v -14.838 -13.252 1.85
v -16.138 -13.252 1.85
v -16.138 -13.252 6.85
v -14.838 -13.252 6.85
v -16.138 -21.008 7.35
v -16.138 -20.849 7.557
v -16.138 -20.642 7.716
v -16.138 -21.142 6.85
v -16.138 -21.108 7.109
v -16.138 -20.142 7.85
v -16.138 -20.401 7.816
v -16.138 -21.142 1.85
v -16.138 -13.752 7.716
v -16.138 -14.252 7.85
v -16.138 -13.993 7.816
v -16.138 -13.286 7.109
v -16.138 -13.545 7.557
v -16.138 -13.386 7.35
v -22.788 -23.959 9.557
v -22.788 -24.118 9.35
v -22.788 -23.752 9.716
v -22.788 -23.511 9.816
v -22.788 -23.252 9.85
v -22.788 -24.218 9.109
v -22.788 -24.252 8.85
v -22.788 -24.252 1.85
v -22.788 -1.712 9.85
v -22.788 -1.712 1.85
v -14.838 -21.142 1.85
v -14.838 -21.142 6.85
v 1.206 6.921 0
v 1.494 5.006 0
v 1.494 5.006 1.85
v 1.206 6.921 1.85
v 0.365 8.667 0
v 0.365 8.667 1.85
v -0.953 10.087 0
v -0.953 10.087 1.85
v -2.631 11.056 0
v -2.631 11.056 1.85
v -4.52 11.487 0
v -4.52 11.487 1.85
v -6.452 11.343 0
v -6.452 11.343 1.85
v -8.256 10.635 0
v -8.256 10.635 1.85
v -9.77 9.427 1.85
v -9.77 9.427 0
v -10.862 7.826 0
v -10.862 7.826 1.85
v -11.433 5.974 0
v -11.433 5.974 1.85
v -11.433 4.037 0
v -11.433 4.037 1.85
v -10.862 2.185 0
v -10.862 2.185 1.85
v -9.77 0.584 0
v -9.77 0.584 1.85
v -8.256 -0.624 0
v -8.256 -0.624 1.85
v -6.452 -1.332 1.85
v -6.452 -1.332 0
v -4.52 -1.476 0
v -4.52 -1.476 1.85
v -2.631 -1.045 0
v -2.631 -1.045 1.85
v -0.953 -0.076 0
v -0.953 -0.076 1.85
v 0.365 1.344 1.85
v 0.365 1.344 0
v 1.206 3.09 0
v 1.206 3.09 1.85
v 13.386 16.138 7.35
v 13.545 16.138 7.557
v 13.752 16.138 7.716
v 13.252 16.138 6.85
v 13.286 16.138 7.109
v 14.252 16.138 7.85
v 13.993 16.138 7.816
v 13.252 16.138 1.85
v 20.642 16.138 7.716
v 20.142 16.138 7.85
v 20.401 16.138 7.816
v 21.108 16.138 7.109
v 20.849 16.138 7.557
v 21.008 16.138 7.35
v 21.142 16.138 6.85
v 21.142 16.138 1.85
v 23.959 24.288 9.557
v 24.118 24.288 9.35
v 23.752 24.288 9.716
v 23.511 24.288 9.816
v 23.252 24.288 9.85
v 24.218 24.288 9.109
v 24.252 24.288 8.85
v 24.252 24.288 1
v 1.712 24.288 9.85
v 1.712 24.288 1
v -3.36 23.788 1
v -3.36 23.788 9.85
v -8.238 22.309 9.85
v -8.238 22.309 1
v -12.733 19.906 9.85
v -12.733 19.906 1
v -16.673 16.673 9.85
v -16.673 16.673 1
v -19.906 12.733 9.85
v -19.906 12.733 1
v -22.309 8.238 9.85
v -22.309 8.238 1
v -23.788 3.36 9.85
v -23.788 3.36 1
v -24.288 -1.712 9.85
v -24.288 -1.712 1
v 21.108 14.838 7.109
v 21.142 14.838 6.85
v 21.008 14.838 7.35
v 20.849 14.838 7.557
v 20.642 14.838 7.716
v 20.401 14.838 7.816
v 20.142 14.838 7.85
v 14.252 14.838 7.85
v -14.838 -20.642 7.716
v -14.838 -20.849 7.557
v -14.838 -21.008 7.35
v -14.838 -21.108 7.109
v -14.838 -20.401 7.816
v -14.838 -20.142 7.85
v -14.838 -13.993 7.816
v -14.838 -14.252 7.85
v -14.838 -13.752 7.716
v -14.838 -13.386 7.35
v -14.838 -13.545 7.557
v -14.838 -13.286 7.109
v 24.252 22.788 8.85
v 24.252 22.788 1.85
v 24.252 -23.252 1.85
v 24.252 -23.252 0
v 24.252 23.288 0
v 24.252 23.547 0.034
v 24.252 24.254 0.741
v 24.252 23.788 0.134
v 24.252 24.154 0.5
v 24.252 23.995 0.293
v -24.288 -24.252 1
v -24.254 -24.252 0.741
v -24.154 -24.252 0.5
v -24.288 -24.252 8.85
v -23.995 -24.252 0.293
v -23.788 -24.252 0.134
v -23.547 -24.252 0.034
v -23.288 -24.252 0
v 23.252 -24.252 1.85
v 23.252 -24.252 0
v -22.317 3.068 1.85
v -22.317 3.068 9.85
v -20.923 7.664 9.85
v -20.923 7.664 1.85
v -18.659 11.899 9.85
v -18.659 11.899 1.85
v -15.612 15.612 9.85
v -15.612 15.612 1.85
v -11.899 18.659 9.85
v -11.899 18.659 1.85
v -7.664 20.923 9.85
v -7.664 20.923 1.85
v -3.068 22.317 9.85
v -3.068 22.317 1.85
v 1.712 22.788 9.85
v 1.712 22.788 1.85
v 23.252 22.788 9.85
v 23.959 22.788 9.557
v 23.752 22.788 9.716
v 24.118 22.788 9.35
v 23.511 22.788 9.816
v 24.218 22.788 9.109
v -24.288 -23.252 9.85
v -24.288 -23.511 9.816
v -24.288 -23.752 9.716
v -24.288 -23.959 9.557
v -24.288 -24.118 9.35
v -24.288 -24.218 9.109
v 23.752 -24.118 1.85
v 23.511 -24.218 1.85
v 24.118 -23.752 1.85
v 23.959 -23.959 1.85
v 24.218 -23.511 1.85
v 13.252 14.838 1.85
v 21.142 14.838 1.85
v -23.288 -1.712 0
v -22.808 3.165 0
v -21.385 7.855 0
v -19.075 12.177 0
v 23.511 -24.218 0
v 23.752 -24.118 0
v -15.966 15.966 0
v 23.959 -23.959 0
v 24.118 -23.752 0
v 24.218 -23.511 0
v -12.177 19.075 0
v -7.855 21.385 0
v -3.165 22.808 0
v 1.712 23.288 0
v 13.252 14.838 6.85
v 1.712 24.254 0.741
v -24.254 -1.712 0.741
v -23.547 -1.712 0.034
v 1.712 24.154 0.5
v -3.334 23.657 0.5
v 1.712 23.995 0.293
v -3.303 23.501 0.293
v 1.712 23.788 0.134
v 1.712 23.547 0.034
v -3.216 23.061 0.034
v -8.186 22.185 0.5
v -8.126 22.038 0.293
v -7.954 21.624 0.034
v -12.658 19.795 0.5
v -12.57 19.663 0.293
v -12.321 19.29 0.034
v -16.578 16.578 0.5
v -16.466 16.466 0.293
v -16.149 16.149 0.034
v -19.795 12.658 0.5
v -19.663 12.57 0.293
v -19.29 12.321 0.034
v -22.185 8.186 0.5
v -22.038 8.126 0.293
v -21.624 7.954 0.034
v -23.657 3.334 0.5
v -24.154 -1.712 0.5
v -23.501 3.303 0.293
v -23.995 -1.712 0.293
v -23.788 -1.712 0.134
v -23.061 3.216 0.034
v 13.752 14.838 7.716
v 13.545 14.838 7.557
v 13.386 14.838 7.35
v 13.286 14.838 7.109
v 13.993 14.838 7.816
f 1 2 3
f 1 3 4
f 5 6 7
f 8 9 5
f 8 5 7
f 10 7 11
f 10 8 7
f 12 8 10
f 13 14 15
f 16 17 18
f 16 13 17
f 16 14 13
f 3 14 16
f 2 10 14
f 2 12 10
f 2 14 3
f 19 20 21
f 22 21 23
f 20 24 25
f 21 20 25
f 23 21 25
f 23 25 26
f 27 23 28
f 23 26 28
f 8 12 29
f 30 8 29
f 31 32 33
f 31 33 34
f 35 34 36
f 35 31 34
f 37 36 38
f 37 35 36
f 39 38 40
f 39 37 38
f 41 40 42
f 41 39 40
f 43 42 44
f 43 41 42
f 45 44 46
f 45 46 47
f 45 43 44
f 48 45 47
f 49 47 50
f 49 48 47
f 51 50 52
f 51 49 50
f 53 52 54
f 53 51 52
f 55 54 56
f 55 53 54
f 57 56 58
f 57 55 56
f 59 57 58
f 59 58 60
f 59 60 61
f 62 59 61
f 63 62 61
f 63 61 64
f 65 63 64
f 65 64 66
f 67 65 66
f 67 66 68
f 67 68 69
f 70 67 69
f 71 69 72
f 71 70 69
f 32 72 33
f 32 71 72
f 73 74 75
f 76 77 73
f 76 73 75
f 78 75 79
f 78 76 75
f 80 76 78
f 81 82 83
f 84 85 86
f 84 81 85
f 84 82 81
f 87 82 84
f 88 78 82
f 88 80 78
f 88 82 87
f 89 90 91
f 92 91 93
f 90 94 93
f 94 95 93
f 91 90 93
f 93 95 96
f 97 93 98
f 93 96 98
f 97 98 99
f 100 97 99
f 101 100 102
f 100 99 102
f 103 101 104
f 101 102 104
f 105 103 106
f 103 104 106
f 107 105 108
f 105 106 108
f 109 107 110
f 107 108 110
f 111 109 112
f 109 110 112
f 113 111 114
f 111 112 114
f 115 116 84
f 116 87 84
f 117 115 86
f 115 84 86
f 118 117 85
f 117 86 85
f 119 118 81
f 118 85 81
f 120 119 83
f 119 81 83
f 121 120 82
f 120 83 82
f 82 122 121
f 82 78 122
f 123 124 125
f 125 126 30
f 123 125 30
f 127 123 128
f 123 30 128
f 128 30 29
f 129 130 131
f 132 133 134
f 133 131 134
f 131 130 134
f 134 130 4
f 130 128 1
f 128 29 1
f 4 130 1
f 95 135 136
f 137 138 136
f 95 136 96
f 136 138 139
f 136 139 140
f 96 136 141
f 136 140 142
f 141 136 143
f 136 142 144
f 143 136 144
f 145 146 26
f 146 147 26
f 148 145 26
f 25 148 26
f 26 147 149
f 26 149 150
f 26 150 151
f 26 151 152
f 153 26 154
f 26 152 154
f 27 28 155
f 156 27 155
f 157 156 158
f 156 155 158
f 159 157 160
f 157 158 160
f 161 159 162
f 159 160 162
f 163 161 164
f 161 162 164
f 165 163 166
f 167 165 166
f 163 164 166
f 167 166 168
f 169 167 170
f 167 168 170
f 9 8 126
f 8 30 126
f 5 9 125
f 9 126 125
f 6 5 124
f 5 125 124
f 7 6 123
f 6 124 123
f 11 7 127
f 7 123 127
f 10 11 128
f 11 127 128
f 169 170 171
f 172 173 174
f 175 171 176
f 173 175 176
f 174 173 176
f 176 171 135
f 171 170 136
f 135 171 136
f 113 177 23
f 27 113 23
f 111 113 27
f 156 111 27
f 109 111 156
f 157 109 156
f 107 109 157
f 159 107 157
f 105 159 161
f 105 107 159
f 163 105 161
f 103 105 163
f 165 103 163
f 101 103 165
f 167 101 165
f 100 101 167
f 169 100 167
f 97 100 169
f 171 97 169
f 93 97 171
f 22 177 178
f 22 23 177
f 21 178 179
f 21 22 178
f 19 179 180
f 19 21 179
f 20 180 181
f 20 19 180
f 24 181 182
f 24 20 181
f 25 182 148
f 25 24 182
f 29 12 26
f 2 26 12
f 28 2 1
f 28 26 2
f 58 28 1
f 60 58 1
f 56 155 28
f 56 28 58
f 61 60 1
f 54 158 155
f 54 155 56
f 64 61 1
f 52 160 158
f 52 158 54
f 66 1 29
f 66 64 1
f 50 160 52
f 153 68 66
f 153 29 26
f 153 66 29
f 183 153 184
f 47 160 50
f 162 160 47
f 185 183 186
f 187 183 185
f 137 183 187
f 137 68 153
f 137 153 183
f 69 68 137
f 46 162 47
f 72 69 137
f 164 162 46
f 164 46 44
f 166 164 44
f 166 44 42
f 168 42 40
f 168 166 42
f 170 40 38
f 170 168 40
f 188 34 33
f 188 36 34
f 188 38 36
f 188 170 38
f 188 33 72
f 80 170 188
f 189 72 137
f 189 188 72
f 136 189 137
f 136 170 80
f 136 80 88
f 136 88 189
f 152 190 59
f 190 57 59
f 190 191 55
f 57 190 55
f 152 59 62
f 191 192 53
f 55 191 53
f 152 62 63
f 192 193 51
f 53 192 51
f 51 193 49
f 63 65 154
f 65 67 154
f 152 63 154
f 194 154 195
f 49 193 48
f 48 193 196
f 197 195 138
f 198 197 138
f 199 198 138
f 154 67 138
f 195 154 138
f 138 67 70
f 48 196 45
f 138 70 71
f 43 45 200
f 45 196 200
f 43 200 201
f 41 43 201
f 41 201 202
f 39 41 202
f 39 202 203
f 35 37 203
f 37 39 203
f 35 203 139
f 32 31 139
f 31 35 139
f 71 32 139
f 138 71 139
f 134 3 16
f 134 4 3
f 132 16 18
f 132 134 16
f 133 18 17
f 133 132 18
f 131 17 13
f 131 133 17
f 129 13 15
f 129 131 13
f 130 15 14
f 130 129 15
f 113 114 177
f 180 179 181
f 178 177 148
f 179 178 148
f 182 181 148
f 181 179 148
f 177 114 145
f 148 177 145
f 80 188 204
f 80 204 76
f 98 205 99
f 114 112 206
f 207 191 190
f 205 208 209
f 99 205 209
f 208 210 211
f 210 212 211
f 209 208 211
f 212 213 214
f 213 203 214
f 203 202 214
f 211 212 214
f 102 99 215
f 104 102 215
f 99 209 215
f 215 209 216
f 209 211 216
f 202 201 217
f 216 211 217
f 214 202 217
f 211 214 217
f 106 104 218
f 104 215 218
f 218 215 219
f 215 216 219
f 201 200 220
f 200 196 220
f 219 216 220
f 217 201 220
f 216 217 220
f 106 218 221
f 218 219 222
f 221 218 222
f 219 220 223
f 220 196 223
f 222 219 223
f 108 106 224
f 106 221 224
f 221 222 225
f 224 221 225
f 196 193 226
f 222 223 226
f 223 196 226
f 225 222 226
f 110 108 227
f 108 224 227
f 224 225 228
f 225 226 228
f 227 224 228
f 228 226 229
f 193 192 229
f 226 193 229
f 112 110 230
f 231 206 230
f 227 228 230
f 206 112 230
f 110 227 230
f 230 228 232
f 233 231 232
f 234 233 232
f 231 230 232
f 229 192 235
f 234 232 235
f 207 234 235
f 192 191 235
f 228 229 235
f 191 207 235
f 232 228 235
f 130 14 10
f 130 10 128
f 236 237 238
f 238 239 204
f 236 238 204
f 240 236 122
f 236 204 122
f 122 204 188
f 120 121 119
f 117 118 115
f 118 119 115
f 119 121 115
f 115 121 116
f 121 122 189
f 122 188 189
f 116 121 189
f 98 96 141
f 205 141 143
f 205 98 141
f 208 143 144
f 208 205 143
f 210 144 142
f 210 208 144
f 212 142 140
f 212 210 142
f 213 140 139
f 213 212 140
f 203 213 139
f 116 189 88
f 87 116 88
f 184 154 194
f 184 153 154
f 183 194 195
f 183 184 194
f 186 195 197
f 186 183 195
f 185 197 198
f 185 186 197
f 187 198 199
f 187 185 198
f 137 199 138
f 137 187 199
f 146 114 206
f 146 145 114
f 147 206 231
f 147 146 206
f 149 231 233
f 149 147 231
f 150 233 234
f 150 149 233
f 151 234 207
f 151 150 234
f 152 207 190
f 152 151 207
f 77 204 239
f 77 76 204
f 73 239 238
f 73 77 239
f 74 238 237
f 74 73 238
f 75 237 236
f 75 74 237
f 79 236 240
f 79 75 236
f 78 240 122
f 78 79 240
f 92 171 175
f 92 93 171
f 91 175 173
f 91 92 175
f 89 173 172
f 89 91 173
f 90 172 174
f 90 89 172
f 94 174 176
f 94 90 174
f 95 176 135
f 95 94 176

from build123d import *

# Parameters (mm, degrees)
F0_R     = 6.5
F1_DEPTH = 1.85
F3_DEPTH = 8
F4_W     = 1.3
F4_H     = 7.89
F4_W_2   = 7.89
F4_H_2   = 1.3
F5_DEPTH = 6
F6_R     = 1


with BuildPart() as f1:
    # F0 (on Top) → F1 (new body)
    with BuildSketch(Plane.XY):
        with BuildLine():
            Line((-24.288, -24.252), (24.252, -24.252))
            Line((24.252, -24.252), (24.252, 24.288))
            Line((24.252, 24.288), (1.712, 24.288))
            ThreePointArc((1.712, 24.288), (-16.672776, 16.672776), (-24.288, -1.712))
            Line((-24.288, -1.712), (-24.288, -24.252))
        make_face()
        with Locations((-5.005514, 5.005514)):
            Circle(F0_R, mode=Mode.SUBTRACT)
    extrude(amount=F1_DEPTH)

    # F2 (on face) → F3 (join)
    with BuildSketch(Plane.XY.offset(1.85)):
        with BuildLine():
            Line((-24.288, -1.712), (-24.288, -24.252))
            Line((-24.288, -24.252), (-22.788, -24.252))
            Line((-22.788, -24.252), (-22.788, -1.712))
            ThreePointArc((-22.788, -1.712), (-15.612116, 15.612116), (1.712, 22.788))
            Line((1.712, 22.788), (24.252, 22.788))
            Line((24.252, 22.788), (24.252, 24.288))
            Line((24.252, 24.288), (1.712, 24.288))
            ThreePointArc((1.712, 24.288), (-16.672776, 16.672776), (-24.288, -1.712))
        make_face()
    extrude(amount=F3_DEPTH)

    # F4 (on face) → F5 (join)
    with BuildSketch(Plane.XY.offset(1.85)):
        with Locations((-15.488, -17.197)):
            Rectangle(F4_W, F4_H)
        with Locations((17.197, 15.488)):
            Rectangle(F4_W_2, F4_H_2)
    extrude(amount=F5_DEPTH)

    # F6
    f6_edges = [f1.edges().sort_by_distance(p)[0] for p in [
        (-23.538, -24.252, 9.85),
        (24.252, 23.538, 9.85),
        (-24.288, -12.982, 0),
        (-15.488, -21.142, 7.85),
        (-15.488, -13.252, 7.85),
        (13.252, 15.488, 7.85),
        (21.142, 15.488, 7.85),
        (24.252, -24.252, 0.925),
    ]]
    fillet(f6_edges, radius=F6_R)


solid = f1.part
